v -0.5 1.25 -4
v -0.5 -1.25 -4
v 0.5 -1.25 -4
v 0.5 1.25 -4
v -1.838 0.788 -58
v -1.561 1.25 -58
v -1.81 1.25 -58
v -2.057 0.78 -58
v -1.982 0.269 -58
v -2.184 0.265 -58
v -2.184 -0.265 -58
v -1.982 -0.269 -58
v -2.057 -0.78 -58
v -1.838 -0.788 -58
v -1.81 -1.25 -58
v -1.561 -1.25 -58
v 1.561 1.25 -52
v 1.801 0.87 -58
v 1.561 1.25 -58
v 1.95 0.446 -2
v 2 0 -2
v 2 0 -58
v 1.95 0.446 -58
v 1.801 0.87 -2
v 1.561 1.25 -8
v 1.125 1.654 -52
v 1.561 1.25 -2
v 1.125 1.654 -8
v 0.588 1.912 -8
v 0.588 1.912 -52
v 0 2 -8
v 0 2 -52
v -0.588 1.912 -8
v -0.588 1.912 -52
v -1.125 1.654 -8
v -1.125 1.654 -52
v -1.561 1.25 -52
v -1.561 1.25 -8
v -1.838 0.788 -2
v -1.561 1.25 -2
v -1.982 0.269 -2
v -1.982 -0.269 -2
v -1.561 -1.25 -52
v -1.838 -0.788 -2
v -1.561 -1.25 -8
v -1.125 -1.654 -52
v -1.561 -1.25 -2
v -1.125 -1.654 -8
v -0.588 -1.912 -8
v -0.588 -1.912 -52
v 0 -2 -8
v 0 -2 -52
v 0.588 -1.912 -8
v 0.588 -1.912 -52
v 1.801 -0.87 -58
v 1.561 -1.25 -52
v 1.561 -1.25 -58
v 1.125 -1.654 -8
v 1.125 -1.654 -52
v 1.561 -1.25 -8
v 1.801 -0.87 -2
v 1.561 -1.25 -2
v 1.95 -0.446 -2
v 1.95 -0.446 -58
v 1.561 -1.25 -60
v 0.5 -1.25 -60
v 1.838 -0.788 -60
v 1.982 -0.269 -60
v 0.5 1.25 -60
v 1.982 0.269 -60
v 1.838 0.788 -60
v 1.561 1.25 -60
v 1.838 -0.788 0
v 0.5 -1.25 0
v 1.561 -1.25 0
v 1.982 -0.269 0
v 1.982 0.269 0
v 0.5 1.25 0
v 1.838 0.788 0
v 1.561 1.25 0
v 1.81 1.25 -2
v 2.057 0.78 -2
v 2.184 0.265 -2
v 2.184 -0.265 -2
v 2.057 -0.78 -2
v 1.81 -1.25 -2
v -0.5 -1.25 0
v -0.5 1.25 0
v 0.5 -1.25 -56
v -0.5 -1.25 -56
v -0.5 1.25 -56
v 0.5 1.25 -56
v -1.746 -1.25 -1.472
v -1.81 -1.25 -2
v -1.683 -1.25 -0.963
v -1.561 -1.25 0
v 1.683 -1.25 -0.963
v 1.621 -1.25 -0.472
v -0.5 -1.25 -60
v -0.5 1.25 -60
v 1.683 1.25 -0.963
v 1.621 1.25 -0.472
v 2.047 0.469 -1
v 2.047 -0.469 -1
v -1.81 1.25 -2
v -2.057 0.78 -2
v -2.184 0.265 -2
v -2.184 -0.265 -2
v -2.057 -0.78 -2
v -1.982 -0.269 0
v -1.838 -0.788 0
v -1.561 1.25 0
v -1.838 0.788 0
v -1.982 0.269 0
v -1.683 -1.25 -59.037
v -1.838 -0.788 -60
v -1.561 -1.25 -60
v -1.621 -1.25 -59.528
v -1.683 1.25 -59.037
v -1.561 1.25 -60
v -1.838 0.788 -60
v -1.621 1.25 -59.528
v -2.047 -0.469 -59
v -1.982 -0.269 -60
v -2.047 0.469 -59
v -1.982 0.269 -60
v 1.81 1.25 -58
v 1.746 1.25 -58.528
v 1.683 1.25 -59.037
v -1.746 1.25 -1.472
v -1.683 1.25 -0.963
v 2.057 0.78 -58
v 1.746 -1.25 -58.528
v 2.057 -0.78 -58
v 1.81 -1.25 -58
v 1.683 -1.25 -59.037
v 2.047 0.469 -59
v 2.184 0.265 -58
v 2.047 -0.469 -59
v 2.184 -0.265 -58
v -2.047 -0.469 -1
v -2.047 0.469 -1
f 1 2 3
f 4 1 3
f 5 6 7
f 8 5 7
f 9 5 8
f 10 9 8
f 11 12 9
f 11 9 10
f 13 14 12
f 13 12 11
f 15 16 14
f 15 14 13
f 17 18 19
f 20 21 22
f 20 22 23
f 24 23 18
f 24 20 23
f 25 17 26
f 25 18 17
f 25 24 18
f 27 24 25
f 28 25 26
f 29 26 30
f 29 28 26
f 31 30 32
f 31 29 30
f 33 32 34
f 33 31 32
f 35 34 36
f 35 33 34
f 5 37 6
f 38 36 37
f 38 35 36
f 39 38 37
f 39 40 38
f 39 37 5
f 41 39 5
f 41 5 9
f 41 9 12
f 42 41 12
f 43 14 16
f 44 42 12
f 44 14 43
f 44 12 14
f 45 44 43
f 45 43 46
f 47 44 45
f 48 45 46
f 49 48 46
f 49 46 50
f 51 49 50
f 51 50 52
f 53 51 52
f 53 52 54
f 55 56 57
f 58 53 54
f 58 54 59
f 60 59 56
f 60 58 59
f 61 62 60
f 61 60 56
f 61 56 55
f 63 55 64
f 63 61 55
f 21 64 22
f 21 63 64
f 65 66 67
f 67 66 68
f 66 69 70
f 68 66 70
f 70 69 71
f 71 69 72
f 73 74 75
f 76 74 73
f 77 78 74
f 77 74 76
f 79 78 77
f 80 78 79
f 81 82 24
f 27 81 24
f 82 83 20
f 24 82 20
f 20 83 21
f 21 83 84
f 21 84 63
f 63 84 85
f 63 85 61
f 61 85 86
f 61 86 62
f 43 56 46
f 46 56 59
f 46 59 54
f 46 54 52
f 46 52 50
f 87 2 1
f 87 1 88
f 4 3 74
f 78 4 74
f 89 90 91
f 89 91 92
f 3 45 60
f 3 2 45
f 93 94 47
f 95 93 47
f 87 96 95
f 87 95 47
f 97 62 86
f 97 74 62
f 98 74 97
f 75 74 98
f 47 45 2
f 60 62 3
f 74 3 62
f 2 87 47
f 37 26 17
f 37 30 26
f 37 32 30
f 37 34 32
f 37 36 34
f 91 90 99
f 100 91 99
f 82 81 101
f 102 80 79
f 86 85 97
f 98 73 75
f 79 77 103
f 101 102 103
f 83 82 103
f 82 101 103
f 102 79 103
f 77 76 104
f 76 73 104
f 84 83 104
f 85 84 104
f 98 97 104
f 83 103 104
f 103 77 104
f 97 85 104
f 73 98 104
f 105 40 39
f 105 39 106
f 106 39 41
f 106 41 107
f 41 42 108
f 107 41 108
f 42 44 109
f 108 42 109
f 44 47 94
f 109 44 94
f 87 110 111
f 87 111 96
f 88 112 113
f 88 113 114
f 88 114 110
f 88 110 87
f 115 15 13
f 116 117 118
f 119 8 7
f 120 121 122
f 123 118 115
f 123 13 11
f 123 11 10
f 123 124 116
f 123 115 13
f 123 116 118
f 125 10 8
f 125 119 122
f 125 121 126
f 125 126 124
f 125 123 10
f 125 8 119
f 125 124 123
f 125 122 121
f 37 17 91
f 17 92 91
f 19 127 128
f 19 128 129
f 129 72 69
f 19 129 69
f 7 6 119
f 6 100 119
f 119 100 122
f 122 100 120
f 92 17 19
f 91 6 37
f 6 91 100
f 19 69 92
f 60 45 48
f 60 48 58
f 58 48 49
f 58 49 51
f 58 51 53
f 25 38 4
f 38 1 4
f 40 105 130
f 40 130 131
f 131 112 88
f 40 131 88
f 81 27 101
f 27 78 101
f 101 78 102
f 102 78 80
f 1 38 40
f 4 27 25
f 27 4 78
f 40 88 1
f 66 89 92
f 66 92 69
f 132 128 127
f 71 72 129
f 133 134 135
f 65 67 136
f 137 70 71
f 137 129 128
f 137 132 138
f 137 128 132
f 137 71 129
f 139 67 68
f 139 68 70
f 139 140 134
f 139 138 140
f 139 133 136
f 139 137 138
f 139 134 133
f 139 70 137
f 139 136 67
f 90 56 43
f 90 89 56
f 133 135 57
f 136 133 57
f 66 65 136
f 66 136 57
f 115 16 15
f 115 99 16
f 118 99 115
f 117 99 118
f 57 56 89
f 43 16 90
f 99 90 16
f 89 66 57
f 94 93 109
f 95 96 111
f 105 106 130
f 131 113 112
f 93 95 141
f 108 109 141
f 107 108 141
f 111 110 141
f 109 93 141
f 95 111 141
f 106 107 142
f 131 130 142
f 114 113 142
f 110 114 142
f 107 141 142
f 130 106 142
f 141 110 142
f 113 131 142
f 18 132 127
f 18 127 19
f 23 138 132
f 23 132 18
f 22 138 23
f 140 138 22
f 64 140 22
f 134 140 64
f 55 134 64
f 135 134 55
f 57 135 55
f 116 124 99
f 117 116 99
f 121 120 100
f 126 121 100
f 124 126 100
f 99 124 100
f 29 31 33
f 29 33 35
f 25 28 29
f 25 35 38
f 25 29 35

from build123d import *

# Parameters (mm, degrees)
SKETCH_1_R               = 2
EXTRUDE_1_DEPTH          = 60
SKETCH_3_W               = 4.2
SKETCH_3_H               = 1
CUT_EXTRUDE_1_DEPTH      = 8
CUT_EXTRUDE_2_REACH      = 62.128
SKETCH_4_W               = 1
SKETCH_4_H               = 4
SKETCH_6_W               = 4.2
SKETCH_6_H               = 1
CUT_EXTRUDE_3_DEPTH      = 8
CUT_EXTRUDE_4_DEPTH      = 61.073621499
CUT_EXTRUDE_4_DEPTH_BACK = 61.073621499
SKETCH_7_W               = 1
SKETCH_7_H               = 4


with BuildPart() as part:
    # 草图1 → 凸台-拉伸1 (new body)
    with BuildSketch(Plane.XY):
        Circle(SKETCH_1_R)
    extrude(amount=-EXTRUDE_1_DEPTH)

    # 草图2 → 旋转1 (revolve)
    with BuildSketch(Plane(origin=(0, 0, 0), x_dir=(1, 0, 0), z_dir=(0, 1, 0))):
        Polygon((0, 0), (0, 2), (2.2, 2), (2, 0), align=None)
    revolve(axis=Axis((0, 0, 0), (0, 0, -1)))

    # 草图3 → 切除-拉伸1 (cut)
    with BuildSketch(Plane.XY):
        with Locations((0, 1.75)):
            Rectangle(SKETCH_3_W, SKETCH_3_H)
        with Locations((0, -1.75)):
            Rectangle(SKETCH_3_W, SKETCH_3_H)
    extrude(amount=-CUT_EXTRUDE_1_DEPTH, mode=Mode.SUBTRACT)

    # 草图4 → 切除-拉伸2 (cut, up to next)
    with BuildSketch(Plane.XZ.offset(1.25), mode=Mode.PRIVATE) as cut_extrude_2_sk1:
        with Locations((0, -2)):
            Rectangle(SKETCH_4_W, SKETCH_4_H)
    cut_extrude_2_tool1 = extrude(cut_extrude_2_sk1.sketch, amount=-CUT_EXTRUDE_2_REACH, mode=Mode.PRIVATE) & part.part
    add(cut_extrude_2_tool1.solids().sort_by_distance((0, -1.25, -2))[0], mode=Mode.SUBTRACT)

    # 草图5 → 旋转2 (revolve)
    with BuildSketch(Plane(origin=(0, 0, 0), x_dir=(1, 0, 0), z_dir=(0, 1, 0))):
        Polygon((0, 60), (0, 58), (2.2, 58), (2, 60), align=None)
    revolve(axis=Axis((0, 0, -58.137689197), (0, 0, -1)))

    # 草图6 → 切除-拉伸3 (cut)
    with BuildSketch(Plane(origin=(0, 0, -60), x_dir=(-1, 0, 0), z_dir=(0, 0, -1))):
        with Locations((0, 1.75)):
            Rectangle(SKETCH_6_W, SKETCH_6_H)
        with Locations((0, -1.75)):
            Rectangle(SKETCH_6_W, SKETCH_6_H)
    extrude(amount=-CUT_EXTRUDE_3_DEPTH, mode=Mode.SUBTRACT)

    # 草图7 → 切除-拉伸4 (cut, two sides: drawn at the far end of the back side and taken through both)
    with BuildSketch(Plane(origin=(0, 0, 0), x_dir=(1, 0, 0), z_dir=(0, 1, 0)).offset(-CUT_EXTRUDE_4_DEPTH_BACK)):
        with Locations((0, 58)):
            Rectangle(SKETCH_7_W, SKETCH_7_H)
    extrude(amount=CUT_EXTRUDE_4_DEPTH + CUT_EXTRUDE_4_DEPTH_BACK, mode=Mode.SUBTRACT)


solid = part.part
